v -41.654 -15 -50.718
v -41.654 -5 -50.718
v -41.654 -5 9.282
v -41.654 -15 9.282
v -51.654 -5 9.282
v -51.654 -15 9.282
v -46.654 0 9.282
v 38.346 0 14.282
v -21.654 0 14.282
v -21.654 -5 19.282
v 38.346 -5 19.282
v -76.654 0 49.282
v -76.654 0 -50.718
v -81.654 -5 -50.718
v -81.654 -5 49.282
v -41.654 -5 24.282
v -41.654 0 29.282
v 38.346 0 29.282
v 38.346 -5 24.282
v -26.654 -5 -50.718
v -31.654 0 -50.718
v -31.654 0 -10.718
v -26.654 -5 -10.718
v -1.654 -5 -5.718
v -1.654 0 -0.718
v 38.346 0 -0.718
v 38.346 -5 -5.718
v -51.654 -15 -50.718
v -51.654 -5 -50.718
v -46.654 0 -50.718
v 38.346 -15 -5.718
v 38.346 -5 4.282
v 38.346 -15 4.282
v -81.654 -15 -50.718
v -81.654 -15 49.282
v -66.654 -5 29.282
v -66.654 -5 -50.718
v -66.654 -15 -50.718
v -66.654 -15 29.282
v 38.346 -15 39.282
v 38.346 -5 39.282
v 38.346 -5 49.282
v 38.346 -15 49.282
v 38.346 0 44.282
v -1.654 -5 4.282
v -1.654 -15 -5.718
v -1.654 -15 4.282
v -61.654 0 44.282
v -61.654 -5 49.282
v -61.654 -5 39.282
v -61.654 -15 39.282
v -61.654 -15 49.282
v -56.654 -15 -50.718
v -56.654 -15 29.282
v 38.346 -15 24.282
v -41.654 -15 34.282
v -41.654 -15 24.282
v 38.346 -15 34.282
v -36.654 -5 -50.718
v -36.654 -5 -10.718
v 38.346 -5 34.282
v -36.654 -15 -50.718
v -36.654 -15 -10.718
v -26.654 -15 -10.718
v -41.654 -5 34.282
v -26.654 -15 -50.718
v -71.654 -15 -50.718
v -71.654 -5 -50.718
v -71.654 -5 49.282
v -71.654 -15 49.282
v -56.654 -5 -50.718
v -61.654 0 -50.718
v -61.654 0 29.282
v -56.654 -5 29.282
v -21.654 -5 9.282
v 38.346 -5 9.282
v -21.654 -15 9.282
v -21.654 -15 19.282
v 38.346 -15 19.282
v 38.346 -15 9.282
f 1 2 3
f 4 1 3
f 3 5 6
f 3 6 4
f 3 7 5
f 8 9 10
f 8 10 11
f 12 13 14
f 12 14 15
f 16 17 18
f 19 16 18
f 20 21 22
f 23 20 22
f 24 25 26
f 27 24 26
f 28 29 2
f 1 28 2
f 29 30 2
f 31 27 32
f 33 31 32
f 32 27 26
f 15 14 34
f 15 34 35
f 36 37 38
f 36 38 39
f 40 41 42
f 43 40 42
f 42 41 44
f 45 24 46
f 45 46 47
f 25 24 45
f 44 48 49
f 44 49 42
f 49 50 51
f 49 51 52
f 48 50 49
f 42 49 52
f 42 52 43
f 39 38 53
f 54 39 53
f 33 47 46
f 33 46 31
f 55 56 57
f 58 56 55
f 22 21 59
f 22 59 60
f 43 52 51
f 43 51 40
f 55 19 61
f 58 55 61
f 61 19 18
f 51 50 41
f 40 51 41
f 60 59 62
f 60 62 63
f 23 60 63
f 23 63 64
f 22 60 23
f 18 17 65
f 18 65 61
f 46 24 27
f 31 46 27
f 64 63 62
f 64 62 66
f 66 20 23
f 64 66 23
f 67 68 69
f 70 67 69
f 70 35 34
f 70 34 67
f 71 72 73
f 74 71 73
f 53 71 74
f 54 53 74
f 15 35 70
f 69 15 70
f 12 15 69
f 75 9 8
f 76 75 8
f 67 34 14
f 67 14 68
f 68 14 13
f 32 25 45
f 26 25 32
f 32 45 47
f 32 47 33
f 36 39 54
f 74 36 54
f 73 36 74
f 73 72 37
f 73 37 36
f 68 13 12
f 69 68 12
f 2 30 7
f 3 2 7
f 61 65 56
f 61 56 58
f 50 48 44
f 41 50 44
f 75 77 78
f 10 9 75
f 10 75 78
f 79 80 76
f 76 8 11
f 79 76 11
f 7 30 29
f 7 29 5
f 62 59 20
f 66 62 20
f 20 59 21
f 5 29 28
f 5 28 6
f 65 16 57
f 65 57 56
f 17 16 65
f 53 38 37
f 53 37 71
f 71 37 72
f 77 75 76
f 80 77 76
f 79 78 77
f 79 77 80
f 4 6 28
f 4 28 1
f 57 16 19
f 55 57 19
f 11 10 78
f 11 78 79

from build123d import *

# Parameters (mm, degrees)
F0_W      = 10
F0_H      = 100
F1_DEPTH  = 15
F0_H_2    = 80
F0_H_3    = 60
F0_H_4    = 40
F0_W_2    = 100
F0_H_5    = 10
F0_W_3    = 80
F0_W_4    = 60
F0_W_5    = 40
F2_SIZE   = 4.99999
F2_2_SIZE = 4.99999
F2_3_SIZE = 4.99999
F2_4_SIZE = 4.99999
F2_5_SIZE = 4.99999
F2_6_SIZE = 4.99999
F2_7_SIZE = 4.99999
F2_8_SIZE = 4.99999


# Not quite as in the source:
# - a fillet or chamfer is up to 0.001 mm smaller than in the source, because OpenCascade refuses the exact size


with BuildPart() as f1:
    # F0 (on Front) → F1 (new body)
    with BuildSketch(Plane.XZ):
        with Locations((-76.6543754238, -0.7175691426)):
            Rectangle(F0_W, F0_H)
    extrude(amount=F1_DEPTH)

    # F2#8 (size 5 in the source; OpenCascade refuses exactly that, so slightly less here)
    f2_8_edges = [f1.edges().sort_by_distance(p)[0] for p in [
        (-71.654375, 0, -0.717569),
        (-81.654375, 0, -0.717569),
    ]]
    chamfer(f2_8_edges, length=F2_8_SIZE)


with BuildPart() as f1b:
    # F0 (on Front) → F1, piece 2 (new body)
    with BuildSketch(Plane.XZ):
        with Locations((-61.6543754238, -10.7175691426)):
            Rectangle(F0_W, F0_H_2)
    extrude(amount=F1_DEPTH)

    # F2#7 (size 5 in the source; OpenCascade refuses exactly that, so slightly less here)
    f2_7_edges = [f1b.edges().sort_by_distance(p)[0] for p in [
        (-56.654375, 0, -10.717569),
        (-66.654375, 0, -10.717569),
    ]]
    chamfer(f2_7_edges, length=F2_7_SIZE)


with BuildPart() as f1c:
    # F0 (on Front) → F1, piece 3 (new body)
    with BuildSketch(Plane.XZ):
        with Locations((-46.6543754238, -20.7175691426)):
            Rectangle(F0_W, F0_H_3)
    extrude(amount=F1_DEPTH)

    # F2#6 (size 5 in the source; OpenCascade refuses exactly that, so slightly less here)
    f2_6_edges = [f1c.edges().sort_by_distance(p)[0] for p in [
        (-41.654375, 0, -20.717569),
        (-51.654375, 0, -20.717569),
    ]]
    chamfer(f2_6_edges, length=F2_6_SIZE)


with BuildPart() as f1d:
    # F0 (on Front) → F1, piece 4 (new body)
    with BuildSketch(Plane.XZ):
        with Locations((-31.6543754238, -30.7175691426)):
            Rectangle(F0_W, F0_H_4)
    extrude(amount=F1_DEPTH)

    # F2#5 (size 5 in the source; OpenCascade refuses exactly that, so slightly less here)
    f2_5_edges = [f1d.edges().sort_by_distance(p)[0] for p in [
        (-26.654375, 0, -30.717569),
        (-36.654375, 0, -30.717569),
    ]]
    chamfer(f2_5_edges, length=F2_5_SIZE)


with BuildPart() as f1e:
    # F0 (on Front) → F1, piece 5 (new body)
    with BuildSketch(Plane.XZ):
        with Locations((-11.6543754238, 44.2824308574)):
            Rectangle(F0_W_2, F0_H_5)
    extrude(amount=F1_DEPTH)

    # F2#4 (size 5 in the source; OpenCascade refuses exactly that, so slightly less here)
    f2_4_edges = [f1e.edges().sort_by_distance(p)[0] for p in [
        (-11.654375, 0, 39.282431),
        (-11.654375, 0, 49.282431),
    ]]
    chamfer(f2_4_edges, length=F2_4_SIZE)


with BuildPart() as f1f:
    # F0 (on Front) → F1, piece 6 (new body)
    with BuildSketch(Plane.XZ):
        with Locations((-1.6543754238, 29.2824308574)):
            Rectangle(F0_W_3, F0_H_5)
    extrude(amount=F1_DEPTH)

    # F2#3 (size 5 in the source; OpenCascade refuses exactly that, so slightly less here)
    f2_3_edges = [f1f.edges().sort_by_distance(p)[0] for p in [
        (-1.654375, 0, 24.282431),
        (-1.654375, 0, 34.282431),
    ]]
    chamfer(f2_3_edges, length=F2_3_SIZE)


with BuildPart() as f1g:
    # F0 (on Front) → F1, piece 7 (new body)
    with BuildSketch(Plane.XZ):
        with Locations((8.3456245762, 14.2824308574)):
            Rectangle(F0_W_4, F0_H_5)
    extrude(amount=F1_DEPTH)

    # F2#2 (size 5 in the source; OpenCascade refuses exactly that, so slightly less here)
    f2_2_edges = [f1g.edges().sort_by_distance(p)[0] for p in [
        (8.345625, 0, 9.282431),
        (8.345625, 0, 19.282431),
    ]]
    chamfer(f2_2_edges, length=F2_2_SIZE)


with BuildPart() as f1h:
    # F0 (on Front) → F1, piece 8 (new body)
    with BuildSketch(Plane.XZ):
        with Locations((18.3456245762, -0.7175691426)):
            Rectangle(F0_W_5, F0_H_5)
    extrude(amount=F1_DEPTH)

    # F2 (size 5 in the source; OpenCascade refuses exactly that, so slightly less here)
    f2_edges = [f1h.edges().sort_by_distance(p)[0] for p in [
        (18.345625, 0, -5.717569),
        (18.345625, 0, 4.282431),
    ]]
    chamfer(f2_edges, length=F2_SIZE)


solid = Compound([f1.part, f1b.part, f1c.part, f1d.part, f1e.part, f1f.part, f1g.part, f1h.part])
